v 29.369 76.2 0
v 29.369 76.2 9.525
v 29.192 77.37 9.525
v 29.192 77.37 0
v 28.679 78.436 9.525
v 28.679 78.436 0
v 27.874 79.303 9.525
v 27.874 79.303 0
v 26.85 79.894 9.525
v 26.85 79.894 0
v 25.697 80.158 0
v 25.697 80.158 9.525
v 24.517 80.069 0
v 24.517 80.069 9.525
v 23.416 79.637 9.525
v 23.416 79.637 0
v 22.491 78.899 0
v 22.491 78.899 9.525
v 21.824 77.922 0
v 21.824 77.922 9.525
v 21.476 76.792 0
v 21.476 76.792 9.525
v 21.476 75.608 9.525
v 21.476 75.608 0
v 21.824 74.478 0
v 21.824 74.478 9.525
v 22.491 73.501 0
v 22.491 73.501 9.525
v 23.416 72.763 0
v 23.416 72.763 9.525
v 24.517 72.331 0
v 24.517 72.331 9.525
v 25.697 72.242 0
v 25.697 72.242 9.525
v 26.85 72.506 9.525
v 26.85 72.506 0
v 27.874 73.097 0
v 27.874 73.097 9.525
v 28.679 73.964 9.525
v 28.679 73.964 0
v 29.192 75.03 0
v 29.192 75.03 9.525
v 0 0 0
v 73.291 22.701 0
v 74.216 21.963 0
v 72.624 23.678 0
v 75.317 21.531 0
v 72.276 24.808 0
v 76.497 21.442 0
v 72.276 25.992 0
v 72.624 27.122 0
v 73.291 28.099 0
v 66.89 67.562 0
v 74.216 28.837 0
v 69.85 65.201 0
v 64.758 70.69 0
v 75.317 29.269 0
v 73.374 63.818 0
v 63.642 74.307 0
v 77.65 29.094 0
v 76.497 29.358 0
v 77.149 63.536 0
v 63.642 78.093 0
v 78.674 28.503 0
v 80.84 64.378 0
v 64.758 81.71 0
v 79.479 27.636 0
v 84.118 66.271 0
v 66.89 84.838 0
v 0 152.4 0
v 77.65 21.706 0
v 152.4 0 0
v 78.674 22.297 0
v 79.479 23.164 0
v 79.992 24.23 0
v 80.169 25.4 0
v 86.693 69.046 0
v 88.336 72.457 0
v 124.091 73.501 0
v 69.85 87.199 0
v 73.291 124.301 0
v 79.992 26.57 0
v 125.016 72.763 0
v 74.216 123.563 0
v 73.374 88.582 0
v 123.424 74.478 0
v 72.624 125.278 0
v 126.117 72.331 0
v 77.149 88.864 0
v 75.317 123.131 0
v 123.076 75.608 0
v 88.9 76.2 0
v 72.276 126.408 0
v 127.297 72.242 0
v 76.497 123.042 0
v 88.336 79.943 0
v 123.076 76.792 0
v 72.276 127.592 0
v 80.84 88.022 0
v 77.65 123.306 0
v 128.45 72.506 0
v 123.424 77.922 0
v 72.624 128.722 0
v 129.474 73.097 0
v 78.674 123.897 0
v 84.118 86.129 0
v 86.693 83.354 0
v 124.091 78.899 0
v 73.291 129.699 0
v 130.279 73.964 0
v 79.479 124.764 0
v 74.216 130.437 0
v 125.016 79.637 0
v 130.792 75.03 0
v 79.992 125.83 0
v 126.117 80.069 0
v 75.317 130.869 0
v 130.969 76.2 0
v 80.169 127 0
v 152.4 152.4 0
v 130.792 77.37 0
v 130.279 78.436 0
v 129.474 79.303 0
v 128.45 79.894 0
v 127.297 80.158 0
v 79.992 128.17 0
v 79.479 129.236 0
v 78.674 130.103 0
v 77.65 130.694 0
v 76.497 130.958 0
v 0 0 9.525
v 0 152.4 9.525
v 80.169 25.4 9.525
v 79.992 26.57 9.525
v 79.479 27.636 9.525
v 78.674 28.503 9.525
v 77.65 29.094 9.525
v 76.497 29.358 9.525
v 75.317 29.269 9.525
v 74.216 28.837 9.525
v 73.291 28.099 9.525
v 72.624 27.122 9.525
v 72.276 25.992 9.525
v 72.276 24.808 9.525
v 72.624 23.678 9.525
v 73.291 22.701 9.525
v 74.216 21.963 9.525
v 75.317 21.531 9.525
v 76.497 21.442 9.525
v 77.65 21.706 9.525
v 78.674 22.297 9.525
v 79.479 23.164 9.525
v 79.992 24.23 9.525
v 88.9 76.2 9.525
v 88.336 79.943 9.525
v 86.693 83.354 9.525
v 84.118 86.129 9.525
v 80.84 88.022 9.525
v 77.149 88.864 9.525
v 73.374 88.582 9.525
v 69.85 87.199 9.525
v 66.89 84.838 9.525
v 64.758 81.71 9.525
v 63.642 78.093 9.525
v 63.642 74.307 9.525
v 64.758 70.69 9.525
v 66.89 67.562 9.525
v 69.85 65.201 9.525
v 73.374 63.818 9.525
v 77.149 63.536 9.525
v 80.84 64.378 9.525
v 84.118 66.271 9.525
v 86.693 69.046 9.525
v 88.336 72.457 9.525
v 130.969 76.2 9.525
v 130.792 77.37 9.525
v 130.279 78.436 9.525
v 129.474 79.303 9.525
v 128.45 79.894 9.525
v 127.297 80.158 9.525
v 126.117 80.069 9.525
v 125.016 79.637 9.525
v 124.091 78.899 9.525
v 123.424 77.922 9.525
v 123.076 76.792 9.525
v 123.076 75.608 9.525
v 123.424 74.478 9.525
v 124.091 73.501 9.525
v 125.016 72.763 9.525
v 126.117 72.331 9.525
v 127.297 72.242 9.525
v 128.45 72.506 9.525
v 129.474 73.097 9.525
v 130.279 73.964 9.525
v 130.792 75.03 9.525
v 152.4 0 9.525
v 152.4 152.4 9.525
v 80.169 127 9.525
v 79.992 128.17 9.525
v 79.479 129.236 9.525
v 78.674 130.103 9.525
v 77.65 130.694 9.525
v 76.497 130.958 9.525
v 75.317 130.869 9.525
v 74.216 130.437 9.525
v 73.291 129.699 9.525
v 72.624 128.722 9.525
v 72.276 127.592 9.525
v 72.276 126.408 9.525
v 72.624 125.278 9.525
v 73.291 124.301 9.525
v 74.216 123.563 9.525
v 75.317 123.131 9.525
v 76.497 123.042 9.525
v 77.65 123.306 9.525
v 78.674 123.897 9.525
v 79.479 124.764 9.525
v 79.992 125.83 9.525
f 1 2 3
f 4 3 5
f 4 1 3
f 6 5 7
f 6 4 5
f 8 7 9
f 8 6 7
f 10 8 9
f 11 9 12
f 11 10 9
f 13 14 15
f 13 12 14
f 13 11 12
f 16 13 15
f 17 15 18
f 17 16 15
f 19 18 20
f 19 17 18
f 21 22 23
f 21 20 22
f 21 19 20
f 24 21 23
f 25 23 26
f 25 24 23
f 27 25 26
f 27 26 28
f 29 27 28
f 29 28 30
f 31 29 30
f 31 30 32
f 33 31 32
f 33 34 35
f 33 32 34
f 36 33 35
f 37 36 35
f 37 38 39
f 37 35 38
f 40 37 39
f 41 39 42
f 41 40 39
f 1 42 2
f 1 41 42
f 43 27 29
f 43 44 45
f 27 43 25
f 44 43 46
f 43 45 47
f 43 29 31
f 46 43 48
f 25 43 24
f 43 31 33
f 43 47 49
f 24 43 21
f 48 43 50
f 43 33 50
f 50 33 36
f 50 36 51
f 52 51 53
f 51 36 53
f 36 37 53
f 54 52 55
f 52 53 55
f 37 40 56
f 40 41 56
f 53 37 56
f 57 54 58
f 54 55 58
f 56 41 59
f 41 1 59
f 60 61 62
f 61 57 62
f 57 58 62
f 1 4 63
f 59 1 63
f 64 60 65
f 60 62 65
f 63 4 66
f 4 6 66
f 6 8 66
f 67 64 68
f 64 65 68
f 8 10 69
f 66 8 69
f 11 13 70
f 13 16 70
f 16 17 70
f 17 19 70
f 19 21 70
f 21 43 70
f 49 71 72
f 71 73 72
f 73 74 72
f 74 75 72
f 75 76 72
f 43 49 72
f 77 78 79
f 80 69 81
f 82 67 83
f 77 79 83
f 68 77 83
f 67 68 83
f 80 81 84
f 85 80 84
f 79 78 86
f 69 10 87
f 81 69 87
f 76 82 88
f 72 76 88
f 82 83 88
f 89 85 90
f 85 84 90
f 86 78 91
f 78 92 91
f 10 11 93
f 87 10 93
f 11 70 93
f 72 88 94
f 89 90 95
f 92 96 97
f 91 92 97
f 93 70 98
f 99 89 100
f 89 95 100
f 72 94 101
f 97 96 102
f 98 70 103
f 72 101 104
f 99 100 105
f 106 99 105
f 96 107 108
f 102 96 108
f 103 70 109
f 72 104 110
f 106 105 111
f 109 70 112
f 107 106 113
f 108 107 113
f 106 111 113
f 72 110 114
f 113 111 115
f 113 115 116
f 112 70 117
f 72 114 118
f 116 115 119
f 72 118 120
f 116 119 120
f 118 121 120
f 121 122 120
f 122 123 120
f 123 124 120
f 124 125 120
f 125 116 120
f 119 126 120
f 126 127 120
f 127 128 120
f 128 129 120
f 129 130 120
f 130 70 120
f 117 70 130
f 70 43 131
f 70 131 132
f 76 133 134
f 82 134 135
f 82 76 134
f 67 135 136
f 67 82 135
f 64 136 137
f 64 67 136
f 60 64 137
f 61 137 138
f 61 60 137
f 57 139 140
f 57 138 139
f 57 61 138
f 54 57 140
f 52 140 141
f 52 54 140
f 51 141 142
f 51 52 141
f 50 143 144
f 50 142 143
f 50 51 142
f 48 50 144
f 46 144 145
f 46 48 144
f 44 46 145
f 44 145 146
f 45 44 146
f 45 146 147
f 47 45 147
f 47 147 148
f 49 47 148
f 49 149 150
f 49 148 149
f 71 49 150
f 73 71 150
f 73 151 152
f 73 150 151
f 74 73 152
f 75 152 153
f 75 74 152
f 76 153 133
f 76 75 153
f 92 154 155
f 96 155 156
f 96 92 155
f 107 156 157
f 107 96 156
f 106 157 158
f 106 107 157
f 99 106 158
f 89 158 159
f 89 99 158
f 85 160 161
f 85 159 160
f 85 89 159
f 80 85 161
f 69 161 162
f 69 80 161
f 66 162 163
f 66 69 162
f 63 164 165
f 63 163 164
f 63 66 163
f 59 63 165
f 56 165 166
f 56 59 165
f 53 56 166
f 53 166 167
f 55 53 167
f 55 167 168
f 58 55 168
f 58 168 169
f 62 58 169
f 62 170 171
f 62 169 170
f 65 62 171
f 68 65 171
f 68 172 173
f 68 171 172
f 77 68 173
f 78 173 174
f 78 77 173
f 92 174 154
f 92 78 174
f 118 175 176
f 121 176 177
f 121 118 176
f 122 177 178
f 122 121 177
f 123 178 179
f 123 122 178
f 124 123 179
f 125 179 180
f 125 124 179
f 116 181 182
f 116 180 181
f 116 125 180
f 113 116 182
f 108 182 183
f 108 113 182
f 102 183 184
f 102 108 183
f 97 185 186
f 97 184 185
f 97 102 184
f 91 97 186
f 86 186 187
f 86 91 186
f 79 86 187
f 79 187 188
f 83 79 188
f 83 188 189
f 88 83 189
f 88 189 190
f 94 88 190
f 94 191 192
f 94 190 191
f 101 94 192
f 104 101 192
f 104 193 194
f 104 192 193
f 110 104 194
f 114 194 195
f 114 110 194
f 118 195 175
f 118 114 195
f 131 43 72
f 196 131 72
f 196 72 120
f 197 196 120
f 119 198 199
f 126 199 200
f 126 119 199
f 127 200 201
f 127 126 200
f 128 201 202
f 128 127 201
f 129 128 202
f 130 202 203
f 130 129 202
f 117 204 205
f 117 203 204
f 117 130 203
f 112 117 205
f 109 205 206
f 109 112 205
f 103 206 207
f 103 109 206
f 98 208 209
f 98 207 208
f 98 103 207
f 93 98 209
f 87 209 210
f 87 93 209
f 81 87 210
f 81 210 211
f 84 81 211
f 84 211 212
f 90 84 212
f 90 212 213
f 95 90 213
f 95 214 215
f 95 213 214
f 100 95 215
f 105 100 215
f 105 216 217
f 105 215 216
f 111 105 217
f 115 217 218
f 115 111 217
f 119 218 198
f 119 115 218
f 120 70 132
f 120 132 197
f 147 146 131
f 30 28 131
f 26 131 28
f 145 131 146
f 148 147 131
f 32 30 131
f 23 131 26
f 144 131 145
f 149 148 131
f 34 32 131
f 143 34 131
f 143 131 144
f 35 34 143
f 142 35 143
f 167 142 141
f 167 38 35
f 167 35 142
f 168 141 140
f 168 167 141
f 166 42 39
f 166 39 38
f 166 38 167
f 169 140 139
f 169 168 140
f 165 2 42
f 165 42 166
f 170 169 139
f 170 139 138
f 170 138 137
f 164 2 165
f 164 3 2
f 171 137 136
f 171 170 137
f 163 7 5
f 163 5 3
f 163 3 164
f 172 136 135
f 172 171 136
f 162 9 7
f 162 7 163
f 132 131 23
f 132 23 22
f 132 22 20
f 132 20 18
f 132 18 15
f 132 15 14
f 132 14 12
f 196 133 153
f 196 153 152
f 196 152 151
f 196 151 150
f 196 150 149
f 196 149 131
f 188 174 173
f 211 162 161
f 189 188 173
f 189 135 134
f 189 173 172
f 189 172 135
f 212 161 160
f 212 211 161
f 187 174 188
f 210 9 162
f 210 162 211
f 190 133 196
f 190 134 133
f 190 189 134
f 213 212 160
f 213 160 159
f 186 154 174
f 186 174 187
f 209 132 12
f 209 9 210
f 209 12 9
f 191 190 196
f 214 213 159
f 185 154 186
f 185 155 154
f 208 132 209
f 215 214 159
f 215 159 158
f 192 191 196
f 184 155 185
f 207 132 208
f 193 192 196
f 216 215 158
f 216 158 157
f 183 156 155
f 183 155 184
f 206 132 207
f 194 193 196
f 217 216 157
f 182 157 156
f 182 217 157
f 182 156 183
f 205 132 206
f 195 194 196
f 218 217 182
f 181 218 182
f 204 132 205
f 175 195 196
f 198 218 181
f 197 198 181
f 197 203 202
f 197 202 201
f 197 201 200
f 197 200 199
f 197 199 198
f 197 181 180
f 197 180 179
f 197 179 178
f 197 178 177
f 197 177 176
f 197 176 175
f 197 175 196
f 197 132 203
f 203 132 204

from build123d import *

# Parameters (mm, degrees)
SKETCH1_W             = 152.4
SKETCH1_H             = 152.4
PLATE_DEPTH           = 9.525
SKETCH3_R             = 3.96875
BOLT_ONE_SKETCH_DEPTH = 216.736518988
SKETCH4_R             = 12.7
CENTRE_BORE2_DEPTH    = 216.736518988


with BuildPart() as part:
    # Sketch1 → plate (new body)
    with BuildSketch(Plane.XY):
        with Locations((76.2, 76.2)):
            Rectangle(SKETCH1_W, SKETCH1_H)
    extrude(amount=PLATE_DEPTH)

    # Sketch3 → bolt_one_sketch (cut, through all)
    with BuildSketch(Plane.XY):
        with Locations((127, 76.2)):
            Circle(SKETCH3_R)
        with Locations((76.2, 127)):
            Circle(SKETCH3_R)
        with Locations((25.4, 76.2)):
            Circle(SKETCH3_R)
        with Locations((76.2, 25.4)):
            Circle(SKETCH3_R)
    extrude(amount=BOLT_ONE_SKETCH_DEPTH, mode=Mode.SUBTRACT)

    # Sketch4 → centre_bore2 (cut, through all)
    with BuildSketch(Plane.XY):
        with Locations((76.2, 76.2)):
            Circle(SKETCH4_R)
    extrude(amount=CENTRE_BORE2_DEPTH, mode=Mode.SUBTRACT)


solid = part.part
